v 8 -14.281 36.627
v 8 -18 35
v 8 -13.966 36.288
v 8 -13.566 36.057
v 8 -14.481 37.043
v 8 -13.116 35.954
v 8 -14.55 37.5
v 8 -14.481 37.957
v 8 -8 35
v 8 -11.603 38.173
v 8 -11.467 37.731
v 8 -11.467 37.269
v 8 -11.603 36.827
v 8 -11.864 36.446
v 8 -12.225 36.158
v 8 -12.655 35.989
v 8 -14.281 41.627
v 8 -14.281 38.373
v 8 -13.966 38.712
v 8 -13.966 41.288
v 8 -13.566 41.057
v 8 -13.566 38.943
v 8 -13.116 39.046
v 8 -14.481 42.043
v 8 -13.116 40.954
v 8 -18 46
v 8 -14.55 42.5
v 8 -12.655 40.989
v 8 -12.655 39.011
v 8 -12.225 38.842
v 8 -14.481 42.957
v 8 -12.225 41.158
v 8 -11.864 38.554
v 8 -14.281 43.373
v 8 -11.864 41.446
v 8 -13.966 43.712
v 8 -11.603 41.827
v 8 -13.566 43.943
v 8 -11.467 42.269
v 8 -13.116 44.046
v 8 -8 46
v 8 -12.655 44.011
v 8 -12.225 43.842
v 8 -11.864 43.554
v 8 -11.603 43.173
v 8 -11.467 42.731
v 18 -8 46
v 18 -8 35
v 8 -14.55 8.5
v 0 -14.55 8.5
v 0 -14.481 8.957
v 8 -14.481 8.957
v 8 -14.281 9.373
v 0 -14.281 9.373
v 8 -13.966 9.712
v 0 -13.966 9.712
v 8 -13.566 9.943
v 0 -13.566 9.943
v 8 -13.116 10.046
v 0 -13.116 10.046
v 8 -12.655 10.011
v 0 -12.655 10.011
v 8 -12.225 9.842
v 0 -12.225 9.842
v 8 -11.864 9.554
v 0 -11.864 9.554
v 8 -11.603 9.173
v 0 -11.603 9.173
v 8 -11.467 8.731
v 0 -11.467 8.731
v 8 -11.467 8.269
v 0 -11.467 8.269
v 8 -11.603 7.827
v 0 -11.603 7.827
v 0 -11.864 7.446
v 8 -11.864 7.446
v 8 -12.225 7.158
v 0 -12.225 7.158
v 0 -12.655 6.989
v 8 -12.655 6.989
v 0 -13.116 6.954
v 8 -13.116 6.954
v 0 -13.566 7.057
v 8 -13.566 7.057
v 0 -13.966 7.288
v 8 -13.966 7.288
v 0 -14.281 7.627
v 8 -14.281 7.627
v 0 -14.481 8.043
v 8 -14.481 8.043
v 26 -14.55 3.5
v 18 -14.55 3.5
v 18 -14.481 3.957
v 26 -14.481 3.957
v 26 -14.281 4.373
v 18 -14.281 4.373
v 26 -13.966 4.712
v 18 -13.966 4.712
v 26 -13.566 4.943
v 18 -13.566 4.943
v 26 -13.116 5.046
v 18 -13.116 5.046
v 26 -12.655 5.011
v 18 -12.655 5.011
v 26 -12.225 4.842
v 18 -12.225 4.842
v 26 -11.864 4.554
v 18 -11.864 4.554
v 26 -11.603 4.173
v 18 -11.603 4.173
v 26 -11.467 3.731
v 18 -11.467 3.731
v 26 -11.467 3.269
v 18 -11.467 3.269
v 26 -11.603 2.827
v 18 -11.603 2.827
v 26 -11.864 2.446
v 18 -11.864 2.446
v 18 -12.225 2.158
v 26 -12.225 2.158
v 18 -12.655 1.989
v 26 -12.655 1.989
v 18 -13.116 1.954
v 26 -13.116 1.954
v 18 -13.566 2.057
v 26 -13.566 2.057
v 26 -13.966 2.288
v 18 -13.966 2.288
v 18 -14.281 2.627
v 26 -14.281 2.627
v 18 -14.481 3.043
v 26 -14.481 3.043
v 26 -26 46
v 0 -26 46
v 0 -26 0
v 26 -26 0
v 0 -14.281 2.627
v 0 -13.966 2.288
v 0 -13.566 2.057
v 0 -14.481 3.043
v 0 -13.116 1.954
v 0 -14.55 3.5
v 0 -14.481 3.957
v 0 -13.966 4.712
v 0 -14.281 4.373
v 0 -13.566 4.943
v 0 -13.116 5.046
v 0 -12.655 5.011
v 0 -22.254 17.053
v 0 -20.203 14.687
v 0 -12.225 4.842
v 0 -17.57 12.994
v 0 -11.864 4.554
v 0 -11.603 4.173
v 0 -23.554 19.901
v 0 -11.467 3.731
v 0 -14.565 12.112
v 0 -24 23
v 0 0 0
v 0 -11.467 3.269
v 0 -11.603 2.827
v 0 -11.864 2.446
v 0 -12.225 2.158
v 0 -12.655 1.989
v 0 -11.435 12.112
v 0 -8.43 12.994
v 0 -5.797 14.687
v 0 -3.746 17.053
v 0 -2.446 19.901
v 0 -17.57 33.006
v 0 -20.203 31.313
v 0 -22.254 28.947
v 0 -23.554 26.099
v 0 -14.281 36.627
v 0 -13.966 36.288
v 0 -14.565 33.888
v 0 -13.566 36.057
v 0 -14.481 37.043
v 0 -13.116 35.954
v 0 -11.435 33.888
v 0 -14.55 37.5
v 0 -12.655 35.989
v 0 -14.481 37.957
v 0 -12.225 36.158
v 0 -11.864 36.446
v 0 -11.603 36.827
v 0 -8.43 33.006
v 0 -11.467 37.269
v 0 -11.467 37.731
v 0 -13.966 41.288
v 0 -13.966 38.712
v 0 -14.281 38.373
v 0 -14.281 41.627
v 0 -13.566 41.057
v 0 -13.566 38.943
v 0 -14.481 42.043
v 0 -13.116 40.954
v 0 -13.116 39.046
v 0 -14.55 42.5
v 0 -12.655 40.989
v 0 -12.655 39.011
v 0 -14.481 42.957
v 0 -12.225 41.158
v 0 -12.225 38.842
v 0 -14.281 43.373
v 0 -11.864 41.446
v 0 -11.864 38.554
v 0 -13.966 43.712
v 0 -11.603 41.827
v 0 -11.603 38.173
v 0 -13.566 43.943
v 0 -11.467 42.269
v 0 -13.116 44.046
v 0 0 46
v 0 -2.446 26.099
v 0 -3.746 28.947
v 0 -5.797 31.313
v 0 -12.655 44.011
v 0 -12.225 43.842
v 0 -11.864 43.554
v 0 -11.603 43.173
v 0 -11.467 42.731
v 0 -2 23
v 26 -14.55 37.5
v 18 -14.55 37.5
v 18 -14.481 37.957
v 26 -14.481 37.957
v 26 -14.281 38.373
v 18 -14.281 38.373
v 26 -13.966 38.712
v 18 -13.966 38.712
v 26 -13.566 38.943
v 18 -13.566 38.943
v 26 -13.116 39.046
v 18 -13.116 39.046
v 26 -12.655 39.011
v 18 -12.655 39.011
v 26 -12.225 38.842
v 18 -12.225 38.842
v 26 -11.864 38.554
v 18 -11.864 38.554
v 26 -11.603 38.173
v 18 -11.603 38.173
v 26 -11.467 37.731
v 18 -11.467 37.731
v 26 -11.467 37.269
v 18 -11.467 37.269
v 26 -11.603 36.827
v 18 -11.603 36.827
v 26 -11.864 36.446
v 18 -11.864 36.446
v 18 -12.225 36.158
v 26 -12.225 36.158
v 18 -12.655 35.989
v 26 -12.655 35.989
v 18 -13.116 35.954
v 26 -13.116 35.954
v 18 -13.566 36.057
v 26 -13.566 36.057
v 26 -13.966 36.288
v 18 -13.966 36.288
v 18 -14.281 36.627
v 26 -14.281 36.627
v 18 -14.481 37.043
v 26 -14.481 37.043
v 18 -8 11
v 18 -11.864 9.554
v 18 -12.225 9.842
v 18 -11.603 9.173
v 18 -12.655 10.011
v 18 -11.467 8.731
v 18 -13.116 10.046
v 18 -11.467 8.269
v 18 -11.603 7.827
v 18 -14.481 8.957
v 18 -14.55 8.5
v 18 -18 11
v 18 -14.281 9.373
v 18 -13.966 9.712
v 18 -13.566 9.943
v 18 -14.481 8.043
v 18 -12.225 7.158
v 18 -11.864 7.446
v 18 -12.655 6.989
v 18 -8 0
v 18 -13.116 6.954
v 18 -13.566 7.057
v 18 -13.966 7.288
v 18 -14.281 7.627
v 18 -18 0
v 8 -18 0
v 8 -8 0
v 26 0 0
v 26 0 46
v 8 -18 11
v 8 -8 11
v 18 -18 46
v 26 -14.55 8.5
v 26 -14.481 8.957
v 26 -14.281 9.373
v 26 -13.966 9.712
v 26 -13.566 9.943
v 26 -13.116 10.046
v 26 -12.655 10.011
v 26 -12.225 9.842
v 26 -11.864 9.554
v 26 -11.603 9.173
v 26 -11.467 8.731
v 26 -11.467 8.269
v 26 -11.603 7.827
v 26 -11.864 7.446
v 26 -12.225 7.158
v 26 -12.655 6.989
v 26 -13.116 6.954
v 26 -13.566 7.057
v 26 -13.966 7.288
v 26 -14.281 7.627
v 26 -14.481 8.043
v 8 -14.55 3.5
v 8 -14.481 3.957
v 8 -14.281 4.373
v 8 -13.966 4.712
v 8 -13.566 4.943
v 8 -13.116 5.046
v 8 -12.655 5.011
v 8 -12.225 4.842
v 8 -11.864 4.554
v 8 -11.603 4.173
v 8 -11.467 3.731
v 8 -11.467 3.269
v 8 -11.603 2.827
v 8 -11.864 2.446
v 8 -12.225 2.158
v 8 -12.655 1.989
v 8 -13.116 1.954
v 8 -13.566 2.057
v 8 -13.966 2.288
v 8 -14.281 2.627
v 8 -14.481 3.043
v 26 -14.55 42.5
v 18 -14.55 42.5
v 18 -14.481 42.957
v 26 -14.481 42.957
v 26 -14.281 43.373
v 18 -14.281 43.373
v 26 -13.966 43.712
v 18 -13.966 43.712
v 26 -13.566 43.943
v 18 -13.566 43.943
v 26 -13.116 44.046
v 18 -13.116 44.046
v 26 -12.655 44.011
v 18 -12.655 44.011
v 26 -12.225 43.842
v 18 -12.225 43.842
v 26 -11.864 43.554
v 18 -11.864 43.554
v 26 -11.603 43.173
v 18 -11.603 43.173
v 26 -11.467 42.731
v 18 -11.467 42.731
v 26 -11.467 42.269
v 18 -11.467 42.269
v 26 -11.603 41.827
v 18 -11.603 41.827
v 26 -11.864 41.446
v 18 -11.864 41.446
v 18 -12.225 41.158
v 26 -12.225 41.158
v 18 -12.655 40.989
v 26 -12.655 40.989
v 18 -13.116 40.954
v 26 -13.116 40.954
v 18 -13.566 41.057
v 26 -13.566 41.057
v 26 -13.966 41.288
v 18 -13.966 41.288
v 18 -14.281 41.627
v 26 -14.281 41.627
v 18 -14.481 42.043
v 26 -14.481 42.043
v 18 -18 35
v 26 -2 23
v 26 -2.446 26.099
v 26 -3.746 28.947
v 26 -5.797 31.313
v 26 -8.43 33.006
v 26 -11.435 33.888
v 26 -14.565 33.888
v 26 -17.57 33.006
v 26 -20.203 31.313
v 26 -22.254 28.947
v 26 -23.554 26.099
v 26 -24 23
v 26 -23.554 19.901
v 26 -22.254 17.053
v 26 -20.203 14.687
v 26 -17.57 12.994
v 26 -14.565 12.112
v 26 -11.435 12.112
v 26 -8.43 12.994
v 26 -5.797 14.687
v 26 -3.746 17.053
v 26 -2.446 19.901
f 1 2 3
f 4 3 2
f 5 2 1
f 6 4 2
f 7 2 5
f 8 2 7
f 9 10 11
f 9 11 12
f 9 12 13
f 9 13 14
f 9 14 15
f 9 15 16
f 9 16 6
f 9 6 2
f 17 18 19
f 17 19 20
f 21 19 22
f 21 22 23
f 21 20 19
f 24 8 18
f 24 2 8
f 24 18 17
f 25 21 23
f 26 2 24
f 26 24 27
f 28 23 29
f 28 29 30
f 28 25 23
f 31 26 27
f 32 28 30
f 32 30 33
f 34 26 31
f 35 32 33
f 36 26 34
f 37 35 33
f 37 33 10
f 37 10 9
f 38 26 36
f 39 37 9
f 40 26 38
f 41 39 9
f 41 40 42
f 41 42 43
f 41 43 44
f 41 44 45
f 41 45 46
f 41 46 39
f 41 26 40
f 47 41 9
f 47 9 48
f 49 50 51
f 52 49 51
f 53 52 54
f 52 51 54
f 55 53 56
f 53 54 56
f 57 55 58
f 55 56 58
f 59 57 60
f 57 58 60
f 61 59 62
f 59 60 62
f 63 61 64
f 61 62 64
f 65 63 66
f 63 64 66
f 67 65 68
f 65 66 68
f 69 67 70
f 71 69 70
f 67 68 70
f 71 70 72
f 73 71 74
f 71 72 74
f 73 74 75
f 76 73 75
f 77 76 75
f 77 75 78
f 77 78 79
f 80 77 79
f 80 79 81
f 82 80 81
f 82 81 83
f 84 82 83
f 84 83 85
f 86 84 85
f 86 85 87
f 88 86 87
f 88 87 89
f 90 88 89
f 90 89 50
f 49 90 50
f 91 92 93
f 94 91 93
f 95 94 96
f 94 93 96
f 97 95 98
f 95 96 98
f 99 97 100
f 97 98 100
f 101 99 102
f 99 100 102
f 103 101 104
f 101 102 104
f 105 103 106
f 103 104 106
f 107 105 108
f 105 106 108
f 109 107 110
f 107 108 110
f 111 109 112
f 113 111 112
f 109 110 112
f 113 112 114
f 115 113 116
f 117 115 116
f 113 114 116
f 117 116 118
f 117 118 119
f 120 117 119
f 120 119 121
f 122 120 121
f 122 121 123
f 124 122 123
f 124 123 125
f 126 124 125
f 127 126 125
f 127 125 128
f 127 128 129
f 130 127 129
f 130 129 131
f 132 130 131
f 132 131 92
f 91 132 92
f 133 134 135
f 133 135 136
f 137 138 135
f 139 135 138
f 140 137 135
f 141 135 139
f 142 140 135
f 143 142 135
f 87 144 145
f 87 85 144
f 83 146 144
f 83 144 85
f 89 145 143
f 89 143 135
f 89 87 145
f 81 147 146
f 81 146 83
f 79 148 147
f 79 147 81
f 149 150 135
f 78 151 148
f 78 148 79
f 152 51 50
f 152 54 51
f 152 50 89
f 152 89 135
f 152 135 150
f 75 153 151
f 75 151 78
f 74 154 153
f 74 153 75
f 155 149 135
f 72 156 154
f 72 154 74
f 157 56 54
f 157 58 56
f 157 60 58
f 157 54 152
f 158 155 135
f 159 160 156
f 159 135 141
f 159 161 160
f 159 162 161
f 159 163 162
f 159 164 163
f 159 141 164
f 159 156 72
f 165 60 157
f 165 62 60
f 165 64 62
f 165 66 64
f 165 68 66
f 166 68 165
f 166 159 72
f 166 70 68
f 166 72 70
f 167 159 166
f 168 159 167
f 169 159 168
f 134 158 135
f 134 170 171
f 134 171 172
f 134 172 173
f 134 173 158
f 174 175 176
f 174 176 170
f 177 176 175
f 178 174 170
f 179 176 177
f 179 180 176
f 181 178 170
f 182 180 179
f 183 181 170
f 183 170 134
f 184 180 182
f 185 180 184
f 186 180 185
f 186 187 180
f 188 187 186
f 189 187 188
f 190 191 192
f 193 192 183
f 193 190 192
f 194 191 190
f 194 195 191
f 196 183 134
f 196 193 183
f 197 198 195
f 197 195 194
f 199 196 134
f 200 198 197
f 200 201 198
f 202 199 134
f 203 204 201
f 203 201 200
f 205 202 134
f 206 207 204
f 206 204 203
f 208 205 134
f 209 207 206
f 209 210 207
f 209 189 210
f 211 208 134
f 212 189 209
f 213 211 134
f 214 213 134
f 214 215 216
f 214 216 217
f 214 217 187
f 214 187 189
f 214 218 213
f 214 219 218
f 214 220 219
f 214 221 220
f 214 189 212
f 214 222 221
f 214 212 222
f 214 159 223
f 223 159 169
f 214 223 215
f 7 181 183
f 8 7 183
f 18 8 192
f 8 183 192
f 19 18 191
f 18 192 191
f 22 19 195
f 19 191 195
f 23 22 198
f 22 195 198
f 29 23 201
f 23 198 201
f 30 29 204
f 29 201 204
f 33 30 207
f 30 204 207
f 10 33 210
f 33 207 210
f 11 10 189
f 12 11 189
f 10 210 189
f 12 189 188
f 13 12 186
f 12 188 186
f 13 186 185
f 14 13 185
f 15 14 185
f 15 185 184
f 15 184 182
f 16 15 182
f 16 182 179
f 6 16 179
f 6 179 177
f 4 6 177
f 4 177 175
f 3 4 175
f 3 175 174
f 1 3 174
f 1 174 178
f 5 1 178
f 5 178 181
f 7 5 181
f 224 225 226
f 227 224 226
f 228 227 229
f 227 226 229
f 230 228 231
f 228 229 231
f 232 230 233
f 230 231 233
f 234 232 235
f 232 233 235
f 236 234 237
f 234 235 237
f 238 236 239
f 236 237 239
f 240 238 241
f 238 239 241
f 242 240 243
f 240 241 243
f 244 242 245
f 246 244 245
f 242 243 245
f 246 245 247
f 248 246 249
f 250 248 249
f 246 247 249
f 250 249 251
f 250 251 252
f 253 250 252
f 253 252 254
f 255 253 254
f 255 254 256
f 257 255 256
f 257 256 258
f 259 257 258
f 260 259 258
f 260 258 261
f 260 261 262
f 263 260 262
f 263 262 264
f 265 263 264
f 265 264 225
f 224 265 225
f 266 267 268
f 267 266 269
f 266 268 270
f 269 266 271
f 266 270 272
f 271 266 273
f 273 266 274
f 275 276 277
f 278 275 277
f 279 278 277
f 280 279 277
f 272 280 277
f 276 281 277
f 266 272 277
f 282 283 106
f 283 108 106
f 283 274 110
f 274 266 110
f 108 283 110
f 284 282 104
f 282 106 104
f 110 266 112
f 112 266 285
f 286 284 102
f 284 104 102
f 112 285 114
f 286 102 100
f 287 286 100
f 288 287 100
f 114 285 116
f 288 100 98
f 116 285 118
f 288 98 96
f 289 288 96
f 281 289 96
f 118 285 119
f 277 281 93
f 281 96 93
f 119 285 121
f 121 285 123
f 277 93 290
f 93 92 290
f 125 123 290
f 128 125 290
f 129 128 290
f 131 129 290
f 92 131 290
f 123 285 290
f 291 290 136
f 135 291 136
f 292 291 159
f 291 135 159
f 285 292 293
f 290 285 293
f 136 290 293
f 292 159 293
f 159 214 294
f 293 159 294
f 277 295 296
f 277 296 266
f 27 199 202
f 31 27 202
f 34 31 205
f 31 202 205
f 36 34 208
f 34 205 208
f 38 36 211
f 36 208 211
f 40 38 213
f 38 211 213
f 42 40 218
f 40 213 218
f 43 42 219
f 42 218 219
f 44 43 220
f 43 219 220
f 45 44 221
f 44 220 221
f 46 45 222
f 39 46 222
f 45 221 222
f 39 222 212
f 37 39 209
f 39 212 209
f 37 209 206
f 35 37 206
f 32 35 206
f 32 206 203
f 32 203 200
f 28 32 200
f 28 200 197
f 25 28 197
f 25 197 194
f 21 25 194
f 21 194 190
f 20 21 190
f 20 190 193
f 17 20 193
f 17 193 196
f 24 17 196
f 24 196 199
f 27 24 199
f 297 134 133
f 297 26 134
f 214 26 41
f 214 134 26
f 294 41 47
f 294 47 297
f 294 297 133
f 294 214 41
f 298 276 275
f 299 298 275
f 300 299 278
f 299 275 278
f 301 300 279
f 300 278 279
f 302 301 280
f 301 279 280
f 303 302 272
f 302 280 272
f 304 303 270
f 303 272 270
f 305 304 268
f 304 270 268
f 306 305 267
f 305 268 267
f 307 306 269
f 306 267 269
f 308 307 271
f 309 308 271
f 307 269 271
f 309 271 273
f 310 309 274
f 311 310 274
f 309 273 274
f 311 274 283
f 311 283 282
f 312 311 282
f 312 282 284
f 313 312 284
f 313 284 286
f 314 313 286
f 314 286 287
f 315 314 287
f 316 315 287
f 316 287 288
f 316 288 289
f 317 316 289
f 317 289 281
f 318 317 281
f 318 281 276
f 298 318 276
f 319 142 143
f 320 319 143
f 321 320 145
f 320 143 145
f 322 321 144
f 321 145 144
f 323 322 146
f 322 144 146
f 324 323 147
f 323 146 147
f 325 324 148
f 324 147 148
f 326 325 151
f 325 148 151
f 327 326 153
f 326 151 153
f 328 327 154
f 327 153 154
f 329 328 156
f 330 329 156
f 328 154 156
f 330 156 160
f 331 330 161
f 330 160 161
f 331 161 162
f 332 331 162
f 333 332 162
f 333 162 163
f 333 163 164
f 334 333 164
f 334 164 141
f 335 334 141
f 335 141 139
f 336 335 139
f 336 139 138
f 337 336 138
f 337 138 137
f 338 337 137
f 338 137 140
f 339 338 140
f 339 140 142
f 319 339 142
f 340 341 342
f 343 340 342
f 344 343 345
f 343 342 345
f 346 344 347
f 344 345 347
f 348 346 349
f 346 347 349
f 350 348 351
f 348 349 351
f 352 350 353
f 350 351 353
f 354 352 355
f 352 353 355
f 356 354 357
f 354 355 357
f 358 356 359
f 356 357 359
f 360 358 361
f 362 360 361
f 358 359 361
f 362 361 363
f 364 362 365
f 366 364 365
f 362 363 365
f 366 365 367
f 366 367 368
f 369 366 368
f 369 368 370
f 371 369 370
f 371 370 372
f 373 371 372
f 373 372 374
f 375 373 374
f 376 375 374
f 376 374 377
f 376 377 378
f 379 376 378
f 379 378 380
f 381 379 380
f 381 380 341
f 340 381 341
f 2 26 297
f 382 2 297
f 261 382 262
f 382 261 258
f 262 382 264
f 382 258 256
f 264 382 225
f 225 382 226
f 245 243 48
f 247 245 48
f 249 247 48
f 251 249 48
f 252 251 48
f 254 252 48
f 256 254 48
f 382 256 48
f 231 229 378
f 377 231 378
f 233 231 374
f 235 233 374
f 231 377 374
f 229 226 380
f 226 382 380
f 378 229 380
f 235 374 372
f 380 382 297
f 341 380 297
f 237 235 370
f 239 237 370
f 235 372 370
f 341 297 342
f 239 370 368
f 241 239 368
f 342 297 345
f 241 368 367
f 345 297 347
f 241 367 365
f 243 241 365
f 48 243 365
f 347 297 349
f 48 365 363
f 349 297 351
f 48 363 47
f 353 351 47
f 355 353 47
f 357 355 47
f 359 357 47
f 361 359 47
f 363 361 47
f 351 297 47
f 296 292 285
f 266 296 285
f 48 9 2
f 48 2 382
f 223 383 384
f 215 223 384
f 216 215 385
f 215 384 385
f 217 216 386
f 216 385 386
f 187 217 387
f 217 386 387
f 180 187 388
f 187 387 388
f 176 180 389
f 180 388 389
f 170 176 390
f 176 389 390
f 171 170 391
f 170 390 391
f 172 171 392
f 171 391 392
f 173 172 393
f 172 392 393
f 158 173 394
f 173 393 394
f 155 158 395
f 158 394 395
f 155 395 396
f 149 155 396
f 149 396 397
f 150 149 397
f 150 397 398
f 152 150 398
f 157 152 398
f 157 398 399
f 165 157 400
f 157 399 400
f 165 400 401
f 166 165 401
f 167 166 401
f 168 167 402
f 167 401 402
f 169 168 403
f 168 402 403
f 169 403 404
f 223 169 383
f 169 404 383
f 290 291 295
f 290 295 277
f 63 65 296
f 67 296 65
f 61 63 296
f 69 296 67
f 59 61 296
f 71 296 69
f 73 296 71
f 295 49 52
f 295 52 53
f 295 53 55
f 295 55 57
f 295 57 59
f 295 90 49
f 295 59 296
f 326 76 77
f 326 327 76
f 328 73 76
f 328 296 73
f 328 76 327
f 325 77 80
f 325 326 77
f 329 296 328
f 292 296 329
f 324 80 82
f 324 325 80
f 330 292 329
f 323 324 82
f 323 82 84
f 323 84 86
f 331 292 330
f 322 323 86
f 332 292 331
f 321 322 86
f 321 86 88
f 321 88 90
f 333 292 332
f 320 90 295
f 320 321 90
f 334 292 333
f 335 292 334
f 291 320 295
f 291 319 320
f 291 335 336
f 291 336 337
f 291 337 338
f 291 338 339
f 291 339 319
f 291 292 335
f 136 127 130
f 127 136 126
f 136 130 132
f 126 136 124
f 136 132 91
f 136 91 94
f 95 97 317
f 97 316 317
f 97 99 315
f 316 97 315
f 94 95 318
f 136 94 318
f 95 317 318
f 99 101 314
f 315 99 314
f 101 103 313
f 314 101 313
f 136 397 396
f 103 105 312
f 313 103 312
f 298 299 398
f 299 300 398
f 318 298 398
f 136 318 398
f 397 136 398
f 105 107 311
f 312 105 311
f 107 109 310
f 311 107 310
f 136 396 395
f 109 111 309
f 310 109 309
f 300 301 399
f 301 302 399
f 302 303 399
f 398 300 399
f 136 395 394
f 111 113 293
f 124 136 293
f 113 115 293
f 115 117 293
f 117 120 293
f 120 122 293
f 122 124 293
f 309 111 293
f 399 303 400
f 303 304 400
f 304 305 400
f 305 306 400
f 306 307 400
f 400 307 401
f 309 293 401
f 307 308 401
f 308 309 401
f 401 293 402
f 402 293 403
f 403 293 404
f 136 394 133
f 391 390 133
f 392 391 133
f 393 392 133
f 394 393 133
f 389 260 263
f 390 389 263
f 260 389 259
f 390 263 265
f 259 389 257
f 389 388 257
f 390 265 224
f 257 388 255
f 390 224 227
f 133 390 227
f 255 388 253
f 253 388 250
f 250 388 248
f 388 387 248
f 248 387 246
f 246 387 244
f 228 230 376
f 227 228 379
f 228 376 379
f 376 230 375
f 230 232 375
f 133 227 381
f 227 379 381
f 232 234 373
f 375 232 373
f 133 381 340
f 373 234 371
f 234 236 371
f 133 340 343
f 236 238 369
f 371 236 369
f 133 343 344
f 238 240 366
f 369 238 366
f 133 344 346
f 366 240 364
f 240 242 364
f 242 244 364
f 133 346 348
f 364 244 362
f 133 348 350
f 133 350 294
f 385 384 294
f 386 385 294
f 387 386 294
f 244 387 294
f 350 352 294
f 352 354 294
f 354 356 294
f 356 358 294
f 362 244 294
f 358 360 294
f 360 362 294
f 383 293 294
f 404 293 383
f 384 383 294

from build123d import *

# Parameters (mm, degrees)
F0_W     = 26
F0_H     = 46
F1_DEPTH = 26
F2_W     = 10
F2_H     = 10
F3_DEPTH = 11
F4_W     = 10
F4_H     = 10
F5_DEPTH = 11
F7_R     = 1.55
F8_DEPTH = 26
F6_R     = 11
F9_DEPTH = 26


with BuildPart() as f1:
    # F0 (on Front) → F1 (new body)
    with BuildSketch(Plane.XZ):
        with Locations((13, 23)):
            Rectangle(F0_W, F0_H)
    extrude(amount=F1_DEPTH)

    # F2 (on face) → F3 (cut)
    with BuildSketch(Plane.XY.offset(46)):
        with Locations((13, -13)):
            Rectangle(F2_W, F2_H)
    extrude(amount=-F3_DEPTH, mode=Mode.SUBTRACT)

    # F4 (on face) → F5 (cut)
    with BuildSketch(Plane(origin=(0, 0, 0), x_dir=(1, 0, 0), z_dir=(0, 0, -1))):
        with Locations((13, 13)):
            Rectangle(F4_W, F4_H)
    extrude(amount=-F5_DEPTH, mode=Mode.SUBTRACT)

    # F7 (on face) → F8 (cut)
    with BuildSketch(Plane(origin=(0, 0, 0), x_dir=(0, -1, 0), z_dir=(-1, 0, 0))):
        with Locations((13, 8.5)):
            Circle(F7_R)
        with Locations((13, 3.5)):
            Circle(F7_R)
        with Locations((13, 42.5)):
            Circle(F7_R)
        with Locations((13, 37.5)):
            Circle(F7_R)
    extrude(amount=-F8_DEPTH, mode=Mode.SUBTRACT)

    # F6 (on face) → F9 (cut)
    with BuildSketch(Plane.YZ.offset(26)):
        with Locations((-13, 23)):
            Circle(F6_R)
    extrude(amount=-F9_DEPTH, mode=Mode.SUBTRACT)


solid = f1.part
